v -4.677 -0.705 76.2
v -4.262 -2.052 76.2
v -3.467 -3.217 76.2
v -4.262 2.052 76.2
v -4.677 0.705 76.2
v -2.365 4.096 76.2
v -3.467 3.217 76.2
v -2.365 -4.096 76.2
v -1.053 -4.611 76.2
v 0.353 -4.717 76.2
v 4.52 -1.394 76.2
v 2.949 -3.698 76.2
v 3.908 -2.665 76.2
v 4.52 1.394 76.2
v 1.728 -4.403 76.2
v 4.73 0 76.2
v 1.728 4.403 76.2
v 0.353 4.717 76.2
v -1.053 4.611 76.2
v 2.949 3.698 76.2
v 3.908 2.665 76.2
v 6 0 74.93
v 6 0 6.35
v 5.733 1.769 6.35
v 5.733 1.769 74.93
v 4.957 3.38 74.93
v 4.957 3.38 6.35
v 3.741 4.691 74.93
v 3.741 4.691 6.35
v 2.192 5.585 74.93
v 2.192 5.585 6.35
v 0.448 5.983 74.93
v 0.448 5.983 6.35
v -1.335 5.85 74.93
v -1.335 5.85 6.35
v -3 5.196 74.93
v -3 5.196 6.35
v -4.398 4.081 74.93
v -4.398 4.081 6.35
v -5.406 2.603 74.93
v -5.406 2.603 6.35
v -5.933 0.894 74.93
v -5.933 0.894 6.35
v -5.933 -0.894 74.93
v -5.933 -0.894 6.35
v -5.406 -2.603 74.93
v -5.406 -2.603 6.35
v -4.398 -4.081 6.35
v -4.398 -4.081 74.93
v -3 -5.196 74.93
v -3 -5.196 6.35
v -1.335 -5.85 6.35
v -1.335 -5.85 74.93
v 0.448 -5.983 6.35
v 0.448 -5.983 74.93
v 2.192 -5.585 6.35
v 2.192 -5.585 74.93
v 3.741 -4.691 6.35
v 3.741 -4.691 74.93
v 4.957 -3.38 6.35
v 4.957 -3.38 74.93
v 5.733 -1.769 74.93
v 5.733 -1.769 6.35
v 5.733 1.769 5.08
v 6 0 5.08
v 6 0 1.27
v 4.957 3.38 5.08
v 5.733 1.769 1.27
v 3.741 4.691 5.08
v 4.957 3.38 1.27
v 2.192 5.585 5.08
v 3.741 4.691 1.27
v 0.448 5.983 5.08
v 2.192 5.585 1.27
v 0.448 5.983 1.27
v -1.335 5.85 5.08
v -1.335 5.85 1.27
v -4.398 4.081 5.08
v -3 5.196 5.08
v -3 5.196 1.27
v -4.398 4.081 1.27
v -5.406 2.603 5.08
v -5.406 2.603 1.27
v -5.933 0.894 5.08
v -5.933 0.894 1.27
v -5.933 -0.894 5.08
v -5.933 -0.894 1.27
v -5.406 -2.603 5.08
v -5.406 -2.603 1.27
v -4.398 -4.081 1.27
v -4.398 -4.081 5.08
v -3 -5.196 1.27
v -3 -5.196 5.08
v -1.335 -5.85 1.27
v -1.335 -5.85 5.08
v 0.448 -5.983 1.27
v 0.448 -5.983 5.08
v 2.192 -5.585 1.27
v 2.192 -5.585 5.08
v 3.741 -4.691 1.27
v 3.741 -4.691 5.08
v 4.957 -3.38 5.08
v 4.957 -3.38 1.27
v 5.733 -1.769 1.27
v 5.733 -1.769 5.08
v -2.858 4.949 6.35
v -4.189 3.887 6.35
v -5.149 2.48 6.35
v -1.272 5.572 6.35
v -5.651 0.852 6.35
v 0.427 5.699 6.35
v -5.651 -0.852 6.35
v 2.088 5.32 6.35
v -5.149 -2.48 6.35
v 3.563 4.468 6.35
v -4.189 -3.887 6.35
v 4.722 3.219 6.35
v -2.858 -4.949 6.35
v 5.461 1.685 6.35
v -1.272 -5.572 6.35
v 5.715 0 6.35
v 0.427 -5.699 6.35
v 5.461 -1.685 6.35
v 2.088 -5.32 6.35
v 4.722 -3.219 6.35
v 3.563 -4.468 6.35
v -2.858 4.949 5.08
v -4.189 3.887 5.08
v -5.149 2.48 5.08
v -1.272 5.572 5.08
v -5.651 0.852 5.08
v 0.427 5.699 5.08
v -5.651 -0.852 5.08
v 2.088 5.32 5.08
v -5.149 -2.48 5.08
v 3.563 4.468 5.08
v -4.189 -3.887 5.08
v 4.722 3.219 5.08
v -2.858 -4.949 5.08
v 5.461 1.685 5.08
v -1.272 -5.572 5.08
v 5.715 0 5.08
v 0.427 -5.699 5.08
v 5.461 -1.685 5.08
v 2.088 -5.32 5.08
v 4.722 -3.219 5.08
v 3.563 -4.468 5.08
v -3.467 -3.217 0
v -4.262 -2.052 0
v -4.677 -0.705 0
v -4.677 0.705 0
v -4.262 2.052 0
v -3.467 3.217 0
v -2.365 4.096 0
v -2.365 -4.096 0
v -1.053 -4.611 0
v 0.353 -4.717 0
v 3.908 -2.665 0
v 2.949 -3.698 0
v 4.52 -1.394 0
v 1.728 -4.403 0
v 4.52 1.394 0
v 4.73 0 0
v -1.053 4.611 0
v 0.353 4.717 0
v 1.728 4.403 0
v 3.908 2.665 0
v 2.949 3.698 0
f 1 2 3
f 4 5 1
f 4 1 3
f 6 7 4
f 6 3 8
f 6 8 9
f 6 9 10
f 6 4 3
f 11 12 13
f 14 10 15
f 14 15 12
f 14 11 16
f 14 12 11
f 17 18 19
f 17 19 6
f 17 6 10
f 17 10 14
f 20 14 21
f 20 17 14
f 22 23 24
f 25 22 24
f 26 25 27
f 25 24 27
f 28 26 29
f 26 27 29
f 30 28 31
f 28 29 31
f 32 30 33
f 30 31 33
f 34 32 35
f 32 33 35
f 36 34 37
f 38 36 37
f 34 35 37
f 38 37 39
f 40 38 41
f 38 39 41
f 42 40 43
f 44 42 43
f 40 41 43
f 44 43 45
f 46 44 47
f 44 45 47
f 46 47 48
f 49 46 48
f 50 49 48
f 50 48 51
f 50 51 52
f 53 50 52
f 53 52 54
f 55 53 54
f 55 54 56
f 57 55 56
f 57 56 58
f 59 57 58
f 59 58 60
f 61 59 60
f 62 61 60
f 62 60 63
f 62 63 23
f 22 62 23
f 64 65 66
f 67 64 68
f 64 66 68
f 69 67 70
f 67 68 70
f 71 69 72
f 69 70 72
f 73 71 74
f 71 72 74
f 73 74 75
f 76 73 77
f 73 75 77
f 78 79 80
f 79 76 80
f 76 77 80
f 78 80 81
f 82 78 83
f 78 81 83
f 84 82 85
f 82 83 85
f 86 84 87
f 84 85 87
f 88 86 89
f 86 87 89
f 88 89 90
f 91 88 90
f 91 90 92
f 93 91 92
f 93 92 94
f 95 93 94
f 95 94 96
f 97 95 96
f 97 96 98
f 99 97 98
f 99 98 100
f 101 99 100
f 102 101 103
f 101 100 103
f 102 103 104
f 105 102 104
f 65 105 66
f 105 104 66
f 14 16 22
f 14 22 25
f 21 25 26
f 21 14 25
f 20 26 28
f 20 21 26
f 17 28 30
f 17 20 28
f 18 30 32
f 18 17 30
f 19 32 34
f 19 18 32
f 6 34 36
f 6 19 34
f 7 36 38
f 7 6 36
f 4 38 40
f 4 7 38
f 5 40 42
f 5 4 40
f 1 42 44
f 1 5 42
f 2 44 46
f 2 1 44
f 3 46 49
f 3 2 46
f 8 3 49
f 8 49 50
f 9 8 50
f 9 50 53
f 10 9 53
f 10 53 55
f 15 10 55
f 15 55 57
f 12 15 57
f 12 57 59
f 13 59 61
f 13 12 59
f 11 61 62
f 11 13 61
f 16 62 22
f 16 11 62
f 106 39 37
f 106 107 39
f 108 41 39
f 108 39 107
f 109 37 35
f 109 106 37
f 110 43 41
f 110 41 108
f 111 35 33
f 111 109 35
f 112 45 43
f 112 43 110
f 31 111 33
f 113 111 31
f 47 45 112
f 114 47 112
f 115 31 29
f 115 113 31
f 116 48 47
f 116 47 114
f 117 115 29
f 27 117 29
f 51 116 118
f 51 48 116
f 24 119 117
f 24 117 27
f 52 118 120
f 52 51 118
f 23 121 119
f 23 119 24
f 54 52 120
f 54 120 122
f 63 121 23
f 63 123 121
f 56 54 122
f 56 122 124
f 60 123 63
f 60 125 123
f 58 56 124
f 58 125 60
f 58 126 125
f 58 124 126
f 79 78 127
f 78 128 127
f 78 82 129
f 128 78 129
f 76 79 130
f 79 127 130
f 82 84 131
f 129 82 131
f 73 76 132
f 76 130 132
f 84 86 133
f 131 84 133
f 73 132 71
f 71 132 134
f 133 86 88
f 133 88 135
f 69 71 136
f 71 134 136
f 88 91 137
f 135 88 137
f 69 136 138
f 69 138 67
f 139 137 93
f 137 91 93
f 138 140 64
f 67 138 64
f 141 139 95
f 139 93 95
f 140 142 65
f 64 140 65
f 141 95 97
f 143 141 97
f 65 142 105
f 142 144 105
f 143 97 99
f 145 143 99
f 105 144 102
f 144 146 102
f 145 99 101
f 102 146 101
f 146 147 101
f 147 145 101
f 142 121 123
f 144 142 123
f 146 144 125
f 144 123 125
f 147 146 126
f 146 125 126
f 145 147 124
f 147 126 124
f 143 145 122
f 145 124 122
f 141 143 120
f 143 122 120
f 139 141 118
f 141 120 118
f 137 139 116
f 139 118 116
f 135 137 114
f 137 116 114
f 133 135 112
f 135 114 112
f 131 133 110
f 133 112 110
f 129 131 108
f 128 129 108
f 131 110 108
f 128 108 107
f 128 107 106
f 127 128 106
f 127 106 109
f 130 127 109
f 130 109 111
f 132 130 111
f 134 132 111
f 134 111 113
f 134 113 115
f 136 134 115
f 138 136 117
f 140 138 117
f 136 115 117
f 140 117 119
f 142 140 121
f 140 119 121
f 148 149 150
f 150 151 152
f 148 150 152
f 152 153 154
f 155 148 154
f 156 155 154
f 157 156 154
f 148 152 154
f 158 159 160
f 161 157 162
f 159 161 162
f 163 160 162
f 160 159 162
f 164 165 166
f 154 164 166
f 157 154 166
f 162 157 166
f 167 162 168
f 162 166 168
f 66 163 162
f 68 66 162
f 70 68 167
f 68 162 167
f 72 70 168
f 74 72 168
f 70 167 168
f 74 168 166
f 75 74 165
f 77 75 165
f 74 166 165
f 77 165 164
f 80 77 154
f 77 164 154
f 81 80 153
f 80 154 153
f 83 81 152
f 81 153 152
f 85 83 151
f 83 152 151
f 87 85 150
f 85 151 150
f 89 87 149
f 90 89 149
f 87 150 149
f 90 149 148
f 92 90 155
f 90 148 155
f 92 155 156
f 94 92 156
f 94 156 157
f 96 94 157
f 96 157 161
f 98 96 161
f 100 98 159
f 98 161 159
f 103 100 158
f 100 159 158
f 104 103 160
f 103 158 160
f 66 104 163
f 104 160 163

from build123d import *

# Parameters (mm, degrees)
F0_R     = 6
F1_DEPTH = 76.2
F3_R     = 6
F3_R_2   = 5.715
F4_DEPTH = 1.27
F5_SIZE  = 1.27


with BuildPart() as f1:
    # F0 (on Top) → F1 (new body)
    with BuildSketch(Plane.XY):
        Circle(F0_R)
    extrude(amount=F1_DEPTH)

    # F3 (on offset) → F4 (cut)
    with BuildSketch(Plane(origin=(0, 0, 6.35), x_dir=(1, 0, 0), z_dir=(0, 0, -1))):
        Circle(F3_R)
        Circle(F3_R_2, mode=Mode.SUBTRACT)
    extrude(amount=F4_DEPTH, mode=Mode.SUBTRACT)

    # F5
    f5_edges = [f1.edges().sort_by_distance(p)[0] for p in [
        (-6, 0, 0),
        (-6, 0, 76.2),
    ]]
    chamfer(f5_edges, length=F5_SIZE)


solid = f1.part
